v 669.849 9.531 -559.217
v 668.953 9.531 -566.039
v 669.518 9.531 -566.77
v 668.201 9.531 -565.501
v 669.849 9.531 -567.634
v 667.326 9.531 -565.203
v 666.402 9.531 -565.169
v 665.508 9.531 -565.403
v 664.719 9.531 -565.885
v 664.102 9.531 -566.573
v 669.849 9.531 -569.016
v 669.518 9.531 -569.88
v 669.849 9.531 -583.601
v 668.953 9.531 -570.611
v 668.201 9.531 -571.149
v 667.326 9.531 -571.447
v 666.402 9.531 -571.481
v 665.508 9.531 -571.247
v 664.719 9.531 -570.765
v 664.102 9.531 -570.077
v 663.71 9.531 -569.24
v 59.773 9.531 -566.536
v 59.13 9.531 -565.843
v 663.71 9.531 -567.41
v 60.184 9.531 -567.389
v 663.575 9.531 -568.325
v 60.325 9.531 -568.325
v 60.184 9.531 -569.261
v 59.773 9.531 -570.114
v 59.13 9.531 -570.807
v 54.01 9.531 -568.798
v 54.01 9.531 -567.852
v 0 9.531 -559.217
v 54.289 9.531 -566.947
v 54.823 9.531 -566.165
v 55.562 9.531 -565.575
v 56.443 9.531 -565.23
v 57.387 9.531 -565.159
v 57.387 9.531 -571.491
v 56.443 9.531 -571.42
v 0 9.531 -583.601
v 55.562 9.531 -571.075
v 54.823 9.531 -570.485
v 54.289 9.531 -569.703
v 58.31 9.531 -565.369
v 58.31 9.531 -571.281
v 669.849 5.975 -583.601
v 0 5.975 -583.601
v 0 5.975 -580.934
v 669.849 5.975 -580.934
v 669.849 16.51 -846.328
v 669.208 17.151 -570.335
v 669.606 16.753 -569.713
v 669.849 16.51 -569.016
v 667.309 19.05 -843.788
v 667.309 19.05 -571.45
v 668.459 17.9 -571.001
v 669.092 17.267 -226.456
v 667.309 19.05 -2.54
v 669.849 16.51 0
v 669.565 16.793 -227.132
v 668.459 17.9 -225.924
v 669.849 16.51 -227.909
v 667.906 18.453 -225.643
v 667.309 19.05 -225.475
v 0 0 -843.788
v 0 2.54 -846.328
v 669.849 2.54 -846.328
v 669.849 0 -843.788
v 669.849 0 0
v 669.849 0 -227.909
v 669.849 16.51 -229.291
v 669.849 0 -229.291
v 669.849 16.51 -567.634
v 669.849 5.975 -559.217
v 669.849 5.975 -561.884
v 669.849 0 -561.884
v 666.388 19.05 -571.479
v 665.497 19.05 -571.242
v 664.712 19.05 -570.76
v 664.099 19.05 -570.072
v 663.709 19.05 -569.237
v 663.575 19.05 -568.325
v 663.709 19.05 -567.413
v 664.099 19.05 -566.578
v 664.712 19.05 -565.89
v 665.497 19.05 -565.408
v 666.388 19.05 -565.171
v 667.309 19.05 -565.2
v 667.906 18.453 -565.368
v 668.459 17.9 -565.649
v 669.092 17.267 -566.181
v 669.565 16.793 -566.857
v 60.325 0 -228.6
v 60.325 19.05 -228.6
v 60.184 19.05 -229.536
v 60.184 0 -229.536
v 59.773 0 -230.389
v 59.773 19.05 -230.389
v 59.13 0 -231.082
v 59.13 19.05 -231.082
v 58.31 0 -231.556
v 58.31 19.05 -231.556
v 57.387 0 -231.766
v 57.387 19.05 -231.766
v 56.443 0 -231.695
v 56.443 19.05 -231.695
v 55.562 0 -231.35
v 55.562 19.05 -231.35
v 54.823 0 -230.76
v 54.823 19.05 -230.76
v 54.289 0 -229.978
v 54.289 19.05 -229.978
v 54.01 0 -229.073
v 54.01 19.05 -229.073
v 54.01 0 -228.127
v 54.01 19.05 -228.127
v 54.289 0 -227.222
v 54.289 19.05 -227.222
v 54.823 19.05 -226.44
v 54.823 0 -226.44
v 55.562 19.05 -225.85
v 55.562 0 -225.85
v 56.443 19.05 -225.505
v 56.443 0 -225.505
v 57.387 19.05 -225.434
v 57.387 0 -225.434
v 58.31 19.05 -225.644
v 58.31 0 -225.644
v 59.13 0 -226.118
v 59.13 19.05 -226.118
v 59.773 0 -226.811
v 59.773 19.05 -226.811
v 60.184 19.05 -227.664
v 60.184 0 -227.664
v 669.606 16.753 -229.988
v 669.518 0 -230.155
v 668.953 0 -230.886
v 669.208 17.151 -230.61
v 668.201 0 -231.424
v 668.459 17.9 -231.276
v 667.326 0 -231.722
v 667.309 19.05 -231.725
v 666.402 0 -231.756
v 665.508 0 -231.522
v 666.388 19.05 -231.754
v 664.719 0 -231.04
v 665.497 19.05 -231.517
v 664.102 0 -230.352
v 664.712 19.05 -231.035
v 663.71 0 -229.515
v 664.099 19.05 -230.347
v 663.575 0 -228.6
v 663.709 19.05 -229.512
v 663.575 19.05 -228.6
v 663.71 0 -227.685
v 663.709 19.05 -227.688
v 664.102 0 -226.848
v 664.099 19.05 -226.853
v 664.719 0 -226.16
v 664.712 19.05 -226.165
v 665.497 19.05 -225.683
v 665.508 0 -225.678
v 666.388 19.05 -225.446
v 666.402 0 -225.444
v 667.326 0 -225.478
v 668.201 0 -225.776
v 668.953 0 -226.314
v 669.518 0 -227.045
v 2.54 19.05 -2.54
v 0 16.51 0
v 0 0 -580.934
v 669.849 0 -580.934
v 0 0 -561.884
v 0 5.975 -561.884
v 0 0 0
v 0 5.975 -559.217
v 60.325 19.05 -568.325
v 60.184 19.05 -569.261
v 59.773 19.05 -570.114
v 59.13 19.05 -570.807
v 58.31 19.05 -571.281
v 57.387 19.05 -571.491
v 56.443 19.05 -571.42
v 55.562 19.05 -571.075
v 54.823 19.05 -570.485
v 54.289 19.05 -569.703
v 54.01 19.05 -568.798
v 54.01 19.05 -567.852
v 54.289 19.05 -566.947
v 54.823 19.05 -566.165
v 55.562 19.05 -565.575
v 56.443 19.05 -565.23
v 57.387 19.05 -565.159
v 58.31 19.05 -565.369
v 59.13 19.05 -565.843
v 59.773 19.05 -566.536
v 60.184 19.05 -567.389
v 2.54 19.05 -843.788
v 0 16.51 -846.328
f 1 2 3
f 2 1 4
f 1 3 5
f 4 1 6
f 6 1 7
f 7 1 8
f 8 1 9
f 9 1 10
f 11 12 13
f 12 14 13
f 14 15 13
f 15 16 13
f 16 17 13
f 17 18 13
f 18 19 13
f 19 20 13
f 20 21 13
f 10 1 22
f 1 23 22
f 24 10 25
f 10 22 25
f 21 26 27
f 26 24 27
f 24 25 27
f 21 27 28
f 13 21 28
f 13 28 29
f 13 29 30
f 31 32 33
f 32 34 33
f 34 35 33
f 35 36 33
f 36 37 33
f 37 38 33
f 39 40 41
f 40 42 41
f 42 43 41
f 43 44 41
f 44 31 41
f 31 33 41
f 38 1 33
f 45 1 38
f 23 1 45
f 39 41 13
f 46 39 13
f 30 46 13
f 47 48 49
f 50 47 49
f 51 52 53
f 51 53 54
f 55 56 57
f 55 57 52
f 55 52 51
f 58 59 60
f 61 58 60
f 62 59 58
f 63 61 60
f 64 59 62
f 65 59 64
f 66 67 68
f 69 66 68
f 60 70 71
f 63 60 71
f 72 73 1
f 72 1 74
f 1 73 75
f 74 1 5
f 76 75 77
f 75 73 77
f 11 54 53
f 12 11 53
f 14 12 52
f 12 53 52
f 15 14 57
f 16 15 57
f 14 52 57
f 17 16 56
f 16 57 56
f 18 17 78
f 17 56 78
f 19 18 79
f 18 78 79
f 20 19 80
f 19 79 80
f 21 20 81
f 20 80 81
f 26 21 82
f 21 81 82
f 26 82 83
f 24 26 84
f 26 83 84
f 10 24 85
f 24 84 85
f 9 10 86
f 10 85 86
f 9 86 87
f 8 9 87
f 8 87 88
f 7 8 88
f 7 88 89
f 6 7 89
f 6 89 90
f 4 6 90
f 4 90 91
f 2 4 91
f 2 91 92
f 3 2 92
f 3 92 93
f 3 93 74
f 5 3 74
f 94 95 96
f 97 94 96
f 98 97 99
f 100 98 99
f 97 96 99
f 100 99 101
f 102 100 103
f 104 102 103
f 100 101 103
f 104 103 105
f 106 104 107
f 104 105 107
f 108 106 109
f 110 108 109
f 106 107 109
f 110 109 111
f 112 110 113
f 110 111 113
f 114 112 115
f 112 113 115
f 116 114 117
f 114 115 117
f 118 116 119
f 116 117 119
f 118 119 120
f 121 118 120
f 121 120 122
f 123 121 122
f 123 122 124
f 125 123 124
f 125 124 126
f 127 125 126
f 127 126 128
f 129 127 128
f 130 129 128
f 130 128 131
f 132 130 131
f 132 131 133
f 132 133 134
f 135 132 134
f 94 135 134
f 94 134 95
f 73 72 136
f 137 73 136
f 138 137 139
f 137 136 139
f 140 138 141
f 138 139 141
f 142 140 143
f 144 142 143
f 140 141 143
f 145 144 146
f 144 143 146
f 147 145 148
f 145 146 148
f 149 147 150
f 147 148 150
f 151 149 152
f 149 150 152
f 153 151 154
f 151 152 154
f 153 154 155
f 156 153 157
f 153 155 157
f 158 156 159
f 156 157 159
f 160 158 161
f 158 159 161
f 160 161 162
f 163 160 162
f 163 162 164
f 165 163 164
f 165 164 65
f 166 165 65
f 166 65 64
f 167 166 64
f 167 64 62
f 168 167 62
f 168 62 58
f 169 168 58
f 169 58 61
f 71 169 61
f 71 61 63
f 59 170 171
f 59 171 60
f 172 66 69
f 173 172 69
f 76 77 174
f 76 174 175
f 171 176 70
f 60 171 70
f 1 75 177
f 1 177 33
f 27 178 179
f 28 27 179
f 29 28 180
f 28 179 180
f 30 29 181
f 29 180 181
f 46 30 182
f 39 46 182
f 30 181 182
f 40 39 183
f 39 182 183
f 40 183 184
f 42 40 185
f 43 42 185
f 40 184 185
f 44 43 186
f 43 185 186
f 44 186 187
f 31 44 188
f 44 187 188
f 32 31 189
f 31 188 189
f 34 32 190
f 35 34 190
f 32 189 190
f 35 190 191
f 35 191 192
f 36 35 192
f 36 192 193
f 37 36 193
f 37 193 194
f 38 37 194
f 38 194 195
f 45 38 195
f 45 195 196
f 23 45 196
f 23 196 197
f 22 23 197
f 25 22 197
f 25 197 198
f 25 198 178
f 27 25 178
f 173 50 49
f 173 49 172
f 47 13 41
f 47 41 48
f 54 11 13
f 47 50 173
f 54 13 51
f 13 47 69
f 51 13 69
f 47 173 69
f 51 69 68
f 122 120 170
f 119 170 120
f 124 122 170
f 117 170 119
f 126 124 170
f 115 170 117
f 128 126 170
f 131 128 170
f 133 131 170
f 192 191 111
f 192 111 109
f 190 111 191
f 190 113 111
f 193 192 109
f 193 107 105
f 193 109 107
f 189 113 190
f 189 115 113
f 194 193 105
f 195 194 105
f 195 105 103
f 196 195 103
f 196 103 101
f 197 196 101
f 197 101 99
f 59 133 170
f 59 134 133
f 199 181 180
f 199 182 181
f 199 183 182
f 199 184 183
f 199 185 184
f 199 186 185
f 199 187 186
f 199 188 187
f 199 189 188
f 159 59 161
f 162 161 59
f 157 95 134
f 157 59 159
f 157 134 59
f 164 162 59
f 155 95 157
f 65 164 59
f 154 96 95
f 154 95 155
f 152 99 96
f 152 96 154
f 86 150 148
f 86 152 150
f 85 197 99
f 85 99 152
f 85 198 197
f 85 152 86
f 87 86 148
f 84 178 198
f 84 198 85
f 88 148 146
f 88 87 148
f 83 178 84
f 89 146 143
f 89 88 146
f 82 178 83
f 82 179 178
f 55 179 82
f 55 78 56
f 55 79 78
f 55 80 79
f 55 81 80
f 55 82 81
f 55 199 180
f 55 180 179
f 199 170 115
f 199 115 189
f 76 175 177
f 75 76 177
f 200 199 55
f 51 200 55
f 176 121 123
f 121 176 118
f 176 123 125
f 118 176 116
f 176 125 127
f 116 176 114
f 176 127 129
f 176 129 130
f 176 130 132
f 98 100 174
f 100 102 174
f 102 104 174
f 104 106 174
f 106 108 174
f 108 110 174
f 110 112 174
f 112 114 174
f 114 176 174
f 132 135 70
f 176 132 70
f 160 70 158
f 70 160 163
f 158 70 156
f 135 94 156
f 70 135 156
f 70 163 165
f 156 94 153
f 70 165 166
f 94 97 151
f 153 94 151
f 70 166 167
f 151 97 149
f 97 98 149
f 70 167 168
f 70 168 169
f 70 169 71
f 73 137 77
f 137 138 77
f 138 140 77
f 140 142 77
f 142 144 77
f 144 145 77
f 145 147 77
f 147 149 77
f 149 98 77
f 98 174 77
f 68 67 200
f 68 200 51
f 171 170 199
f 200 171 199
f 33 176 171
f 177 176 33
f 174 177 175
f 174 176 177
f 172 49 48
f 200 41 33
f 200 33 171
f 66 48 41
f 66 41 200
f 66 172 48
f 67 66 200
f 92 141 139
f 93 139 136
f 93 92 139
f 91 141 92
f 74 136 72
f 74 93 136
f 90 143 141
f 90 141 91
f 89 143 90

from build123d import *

# Parameters (mm, degrees)
SKETCH1_W           = 669.8488
SKETCH1_H           = 846.328
BOSS_EXTRUDE1_DEPTH = 19.05
CHAMFER1_SIZE       = 2.54
CHAMFER2_SIZE       = 2.54
CUT_EXTRUDE2_DEPTH  = 670.8488
SKETCH2_R           = 3.175
CUT_EXTRUDE3_DEPTH  = 20.05


with BuildPart() as part:
    # Sketch1 → Boss-Extrude1 (new body)
    with BuildSketch(Plane(origin=(0, 0, 0), x_dir=(1, 0, 0), z_dir=(0, 1, 0))):
        with Locations((334.9244, 423.164)):
            Rectangle(SKETCH1_W, SKETCH1_H)
    extrude(amount=BOSS_EXTRUDE1_DEPTH)

    # Chamfer1
    chamfer1_edges = [part.edges().sort_by_distance(p)[0] for p in [
        (669.8488, 19.05, -423.164),
        (334.9244, 19.05, -846.328),
        (0, 19.05, -423.164),
        (334.9244, 19.05, 0),
    ]]
    chamfer(chamfer1_edges, length=CHAMFER1_SIZE)

    # Chamfer2
    chamfer2_edges = [part.edges().sort_by_distance(p)[0] for p in [
        (334.9244, 0, -846.328),
    ]]
    chamfer(chamfer2_edges, length=CHAMFER2_SIZE)

    # Sketch3 → Cut-Extrude2 (cut, through all)
    with BuildSketch(Plane.ZY):
        Polygon((-580.93356, 5.97535), (-580.93356, 0), (-561.88356, 0), (-561.88356, 5.97535), (-559.21656, 5.97535), (-559.21656, 9.53135), (-583.60056, 9.53135), (-583.60056, 5.97535), align=None)
    extrude(amount=-CUT_EXTRUDE2_DEPTH, mode=Mode.SUBTRACT)

    # Sketch2 → Cut-Extrude3 (cut, through all)
    with BuildSketch(Plane(origin=(0, 19.05, 0), x_dir=(1, 0, 0), z_dir=(0, 1, 0))):
        with Locations((57.15, 568.325)):
            Circle(SKETCH2_R)
        with Locations((57.15, 228.6)):
            Circle(SKETCH2_R)
        with Locations((666.75, 568.325)):
            Circle(SKETCH2_R)
        with Locations((666.75, 228.6)):
            Circle(SKETCH2_R)
    extrude(amount=-CUT_EXTRUDE3_DEPTH, mode=Mode.SUBTRACT)


solid = part.part
